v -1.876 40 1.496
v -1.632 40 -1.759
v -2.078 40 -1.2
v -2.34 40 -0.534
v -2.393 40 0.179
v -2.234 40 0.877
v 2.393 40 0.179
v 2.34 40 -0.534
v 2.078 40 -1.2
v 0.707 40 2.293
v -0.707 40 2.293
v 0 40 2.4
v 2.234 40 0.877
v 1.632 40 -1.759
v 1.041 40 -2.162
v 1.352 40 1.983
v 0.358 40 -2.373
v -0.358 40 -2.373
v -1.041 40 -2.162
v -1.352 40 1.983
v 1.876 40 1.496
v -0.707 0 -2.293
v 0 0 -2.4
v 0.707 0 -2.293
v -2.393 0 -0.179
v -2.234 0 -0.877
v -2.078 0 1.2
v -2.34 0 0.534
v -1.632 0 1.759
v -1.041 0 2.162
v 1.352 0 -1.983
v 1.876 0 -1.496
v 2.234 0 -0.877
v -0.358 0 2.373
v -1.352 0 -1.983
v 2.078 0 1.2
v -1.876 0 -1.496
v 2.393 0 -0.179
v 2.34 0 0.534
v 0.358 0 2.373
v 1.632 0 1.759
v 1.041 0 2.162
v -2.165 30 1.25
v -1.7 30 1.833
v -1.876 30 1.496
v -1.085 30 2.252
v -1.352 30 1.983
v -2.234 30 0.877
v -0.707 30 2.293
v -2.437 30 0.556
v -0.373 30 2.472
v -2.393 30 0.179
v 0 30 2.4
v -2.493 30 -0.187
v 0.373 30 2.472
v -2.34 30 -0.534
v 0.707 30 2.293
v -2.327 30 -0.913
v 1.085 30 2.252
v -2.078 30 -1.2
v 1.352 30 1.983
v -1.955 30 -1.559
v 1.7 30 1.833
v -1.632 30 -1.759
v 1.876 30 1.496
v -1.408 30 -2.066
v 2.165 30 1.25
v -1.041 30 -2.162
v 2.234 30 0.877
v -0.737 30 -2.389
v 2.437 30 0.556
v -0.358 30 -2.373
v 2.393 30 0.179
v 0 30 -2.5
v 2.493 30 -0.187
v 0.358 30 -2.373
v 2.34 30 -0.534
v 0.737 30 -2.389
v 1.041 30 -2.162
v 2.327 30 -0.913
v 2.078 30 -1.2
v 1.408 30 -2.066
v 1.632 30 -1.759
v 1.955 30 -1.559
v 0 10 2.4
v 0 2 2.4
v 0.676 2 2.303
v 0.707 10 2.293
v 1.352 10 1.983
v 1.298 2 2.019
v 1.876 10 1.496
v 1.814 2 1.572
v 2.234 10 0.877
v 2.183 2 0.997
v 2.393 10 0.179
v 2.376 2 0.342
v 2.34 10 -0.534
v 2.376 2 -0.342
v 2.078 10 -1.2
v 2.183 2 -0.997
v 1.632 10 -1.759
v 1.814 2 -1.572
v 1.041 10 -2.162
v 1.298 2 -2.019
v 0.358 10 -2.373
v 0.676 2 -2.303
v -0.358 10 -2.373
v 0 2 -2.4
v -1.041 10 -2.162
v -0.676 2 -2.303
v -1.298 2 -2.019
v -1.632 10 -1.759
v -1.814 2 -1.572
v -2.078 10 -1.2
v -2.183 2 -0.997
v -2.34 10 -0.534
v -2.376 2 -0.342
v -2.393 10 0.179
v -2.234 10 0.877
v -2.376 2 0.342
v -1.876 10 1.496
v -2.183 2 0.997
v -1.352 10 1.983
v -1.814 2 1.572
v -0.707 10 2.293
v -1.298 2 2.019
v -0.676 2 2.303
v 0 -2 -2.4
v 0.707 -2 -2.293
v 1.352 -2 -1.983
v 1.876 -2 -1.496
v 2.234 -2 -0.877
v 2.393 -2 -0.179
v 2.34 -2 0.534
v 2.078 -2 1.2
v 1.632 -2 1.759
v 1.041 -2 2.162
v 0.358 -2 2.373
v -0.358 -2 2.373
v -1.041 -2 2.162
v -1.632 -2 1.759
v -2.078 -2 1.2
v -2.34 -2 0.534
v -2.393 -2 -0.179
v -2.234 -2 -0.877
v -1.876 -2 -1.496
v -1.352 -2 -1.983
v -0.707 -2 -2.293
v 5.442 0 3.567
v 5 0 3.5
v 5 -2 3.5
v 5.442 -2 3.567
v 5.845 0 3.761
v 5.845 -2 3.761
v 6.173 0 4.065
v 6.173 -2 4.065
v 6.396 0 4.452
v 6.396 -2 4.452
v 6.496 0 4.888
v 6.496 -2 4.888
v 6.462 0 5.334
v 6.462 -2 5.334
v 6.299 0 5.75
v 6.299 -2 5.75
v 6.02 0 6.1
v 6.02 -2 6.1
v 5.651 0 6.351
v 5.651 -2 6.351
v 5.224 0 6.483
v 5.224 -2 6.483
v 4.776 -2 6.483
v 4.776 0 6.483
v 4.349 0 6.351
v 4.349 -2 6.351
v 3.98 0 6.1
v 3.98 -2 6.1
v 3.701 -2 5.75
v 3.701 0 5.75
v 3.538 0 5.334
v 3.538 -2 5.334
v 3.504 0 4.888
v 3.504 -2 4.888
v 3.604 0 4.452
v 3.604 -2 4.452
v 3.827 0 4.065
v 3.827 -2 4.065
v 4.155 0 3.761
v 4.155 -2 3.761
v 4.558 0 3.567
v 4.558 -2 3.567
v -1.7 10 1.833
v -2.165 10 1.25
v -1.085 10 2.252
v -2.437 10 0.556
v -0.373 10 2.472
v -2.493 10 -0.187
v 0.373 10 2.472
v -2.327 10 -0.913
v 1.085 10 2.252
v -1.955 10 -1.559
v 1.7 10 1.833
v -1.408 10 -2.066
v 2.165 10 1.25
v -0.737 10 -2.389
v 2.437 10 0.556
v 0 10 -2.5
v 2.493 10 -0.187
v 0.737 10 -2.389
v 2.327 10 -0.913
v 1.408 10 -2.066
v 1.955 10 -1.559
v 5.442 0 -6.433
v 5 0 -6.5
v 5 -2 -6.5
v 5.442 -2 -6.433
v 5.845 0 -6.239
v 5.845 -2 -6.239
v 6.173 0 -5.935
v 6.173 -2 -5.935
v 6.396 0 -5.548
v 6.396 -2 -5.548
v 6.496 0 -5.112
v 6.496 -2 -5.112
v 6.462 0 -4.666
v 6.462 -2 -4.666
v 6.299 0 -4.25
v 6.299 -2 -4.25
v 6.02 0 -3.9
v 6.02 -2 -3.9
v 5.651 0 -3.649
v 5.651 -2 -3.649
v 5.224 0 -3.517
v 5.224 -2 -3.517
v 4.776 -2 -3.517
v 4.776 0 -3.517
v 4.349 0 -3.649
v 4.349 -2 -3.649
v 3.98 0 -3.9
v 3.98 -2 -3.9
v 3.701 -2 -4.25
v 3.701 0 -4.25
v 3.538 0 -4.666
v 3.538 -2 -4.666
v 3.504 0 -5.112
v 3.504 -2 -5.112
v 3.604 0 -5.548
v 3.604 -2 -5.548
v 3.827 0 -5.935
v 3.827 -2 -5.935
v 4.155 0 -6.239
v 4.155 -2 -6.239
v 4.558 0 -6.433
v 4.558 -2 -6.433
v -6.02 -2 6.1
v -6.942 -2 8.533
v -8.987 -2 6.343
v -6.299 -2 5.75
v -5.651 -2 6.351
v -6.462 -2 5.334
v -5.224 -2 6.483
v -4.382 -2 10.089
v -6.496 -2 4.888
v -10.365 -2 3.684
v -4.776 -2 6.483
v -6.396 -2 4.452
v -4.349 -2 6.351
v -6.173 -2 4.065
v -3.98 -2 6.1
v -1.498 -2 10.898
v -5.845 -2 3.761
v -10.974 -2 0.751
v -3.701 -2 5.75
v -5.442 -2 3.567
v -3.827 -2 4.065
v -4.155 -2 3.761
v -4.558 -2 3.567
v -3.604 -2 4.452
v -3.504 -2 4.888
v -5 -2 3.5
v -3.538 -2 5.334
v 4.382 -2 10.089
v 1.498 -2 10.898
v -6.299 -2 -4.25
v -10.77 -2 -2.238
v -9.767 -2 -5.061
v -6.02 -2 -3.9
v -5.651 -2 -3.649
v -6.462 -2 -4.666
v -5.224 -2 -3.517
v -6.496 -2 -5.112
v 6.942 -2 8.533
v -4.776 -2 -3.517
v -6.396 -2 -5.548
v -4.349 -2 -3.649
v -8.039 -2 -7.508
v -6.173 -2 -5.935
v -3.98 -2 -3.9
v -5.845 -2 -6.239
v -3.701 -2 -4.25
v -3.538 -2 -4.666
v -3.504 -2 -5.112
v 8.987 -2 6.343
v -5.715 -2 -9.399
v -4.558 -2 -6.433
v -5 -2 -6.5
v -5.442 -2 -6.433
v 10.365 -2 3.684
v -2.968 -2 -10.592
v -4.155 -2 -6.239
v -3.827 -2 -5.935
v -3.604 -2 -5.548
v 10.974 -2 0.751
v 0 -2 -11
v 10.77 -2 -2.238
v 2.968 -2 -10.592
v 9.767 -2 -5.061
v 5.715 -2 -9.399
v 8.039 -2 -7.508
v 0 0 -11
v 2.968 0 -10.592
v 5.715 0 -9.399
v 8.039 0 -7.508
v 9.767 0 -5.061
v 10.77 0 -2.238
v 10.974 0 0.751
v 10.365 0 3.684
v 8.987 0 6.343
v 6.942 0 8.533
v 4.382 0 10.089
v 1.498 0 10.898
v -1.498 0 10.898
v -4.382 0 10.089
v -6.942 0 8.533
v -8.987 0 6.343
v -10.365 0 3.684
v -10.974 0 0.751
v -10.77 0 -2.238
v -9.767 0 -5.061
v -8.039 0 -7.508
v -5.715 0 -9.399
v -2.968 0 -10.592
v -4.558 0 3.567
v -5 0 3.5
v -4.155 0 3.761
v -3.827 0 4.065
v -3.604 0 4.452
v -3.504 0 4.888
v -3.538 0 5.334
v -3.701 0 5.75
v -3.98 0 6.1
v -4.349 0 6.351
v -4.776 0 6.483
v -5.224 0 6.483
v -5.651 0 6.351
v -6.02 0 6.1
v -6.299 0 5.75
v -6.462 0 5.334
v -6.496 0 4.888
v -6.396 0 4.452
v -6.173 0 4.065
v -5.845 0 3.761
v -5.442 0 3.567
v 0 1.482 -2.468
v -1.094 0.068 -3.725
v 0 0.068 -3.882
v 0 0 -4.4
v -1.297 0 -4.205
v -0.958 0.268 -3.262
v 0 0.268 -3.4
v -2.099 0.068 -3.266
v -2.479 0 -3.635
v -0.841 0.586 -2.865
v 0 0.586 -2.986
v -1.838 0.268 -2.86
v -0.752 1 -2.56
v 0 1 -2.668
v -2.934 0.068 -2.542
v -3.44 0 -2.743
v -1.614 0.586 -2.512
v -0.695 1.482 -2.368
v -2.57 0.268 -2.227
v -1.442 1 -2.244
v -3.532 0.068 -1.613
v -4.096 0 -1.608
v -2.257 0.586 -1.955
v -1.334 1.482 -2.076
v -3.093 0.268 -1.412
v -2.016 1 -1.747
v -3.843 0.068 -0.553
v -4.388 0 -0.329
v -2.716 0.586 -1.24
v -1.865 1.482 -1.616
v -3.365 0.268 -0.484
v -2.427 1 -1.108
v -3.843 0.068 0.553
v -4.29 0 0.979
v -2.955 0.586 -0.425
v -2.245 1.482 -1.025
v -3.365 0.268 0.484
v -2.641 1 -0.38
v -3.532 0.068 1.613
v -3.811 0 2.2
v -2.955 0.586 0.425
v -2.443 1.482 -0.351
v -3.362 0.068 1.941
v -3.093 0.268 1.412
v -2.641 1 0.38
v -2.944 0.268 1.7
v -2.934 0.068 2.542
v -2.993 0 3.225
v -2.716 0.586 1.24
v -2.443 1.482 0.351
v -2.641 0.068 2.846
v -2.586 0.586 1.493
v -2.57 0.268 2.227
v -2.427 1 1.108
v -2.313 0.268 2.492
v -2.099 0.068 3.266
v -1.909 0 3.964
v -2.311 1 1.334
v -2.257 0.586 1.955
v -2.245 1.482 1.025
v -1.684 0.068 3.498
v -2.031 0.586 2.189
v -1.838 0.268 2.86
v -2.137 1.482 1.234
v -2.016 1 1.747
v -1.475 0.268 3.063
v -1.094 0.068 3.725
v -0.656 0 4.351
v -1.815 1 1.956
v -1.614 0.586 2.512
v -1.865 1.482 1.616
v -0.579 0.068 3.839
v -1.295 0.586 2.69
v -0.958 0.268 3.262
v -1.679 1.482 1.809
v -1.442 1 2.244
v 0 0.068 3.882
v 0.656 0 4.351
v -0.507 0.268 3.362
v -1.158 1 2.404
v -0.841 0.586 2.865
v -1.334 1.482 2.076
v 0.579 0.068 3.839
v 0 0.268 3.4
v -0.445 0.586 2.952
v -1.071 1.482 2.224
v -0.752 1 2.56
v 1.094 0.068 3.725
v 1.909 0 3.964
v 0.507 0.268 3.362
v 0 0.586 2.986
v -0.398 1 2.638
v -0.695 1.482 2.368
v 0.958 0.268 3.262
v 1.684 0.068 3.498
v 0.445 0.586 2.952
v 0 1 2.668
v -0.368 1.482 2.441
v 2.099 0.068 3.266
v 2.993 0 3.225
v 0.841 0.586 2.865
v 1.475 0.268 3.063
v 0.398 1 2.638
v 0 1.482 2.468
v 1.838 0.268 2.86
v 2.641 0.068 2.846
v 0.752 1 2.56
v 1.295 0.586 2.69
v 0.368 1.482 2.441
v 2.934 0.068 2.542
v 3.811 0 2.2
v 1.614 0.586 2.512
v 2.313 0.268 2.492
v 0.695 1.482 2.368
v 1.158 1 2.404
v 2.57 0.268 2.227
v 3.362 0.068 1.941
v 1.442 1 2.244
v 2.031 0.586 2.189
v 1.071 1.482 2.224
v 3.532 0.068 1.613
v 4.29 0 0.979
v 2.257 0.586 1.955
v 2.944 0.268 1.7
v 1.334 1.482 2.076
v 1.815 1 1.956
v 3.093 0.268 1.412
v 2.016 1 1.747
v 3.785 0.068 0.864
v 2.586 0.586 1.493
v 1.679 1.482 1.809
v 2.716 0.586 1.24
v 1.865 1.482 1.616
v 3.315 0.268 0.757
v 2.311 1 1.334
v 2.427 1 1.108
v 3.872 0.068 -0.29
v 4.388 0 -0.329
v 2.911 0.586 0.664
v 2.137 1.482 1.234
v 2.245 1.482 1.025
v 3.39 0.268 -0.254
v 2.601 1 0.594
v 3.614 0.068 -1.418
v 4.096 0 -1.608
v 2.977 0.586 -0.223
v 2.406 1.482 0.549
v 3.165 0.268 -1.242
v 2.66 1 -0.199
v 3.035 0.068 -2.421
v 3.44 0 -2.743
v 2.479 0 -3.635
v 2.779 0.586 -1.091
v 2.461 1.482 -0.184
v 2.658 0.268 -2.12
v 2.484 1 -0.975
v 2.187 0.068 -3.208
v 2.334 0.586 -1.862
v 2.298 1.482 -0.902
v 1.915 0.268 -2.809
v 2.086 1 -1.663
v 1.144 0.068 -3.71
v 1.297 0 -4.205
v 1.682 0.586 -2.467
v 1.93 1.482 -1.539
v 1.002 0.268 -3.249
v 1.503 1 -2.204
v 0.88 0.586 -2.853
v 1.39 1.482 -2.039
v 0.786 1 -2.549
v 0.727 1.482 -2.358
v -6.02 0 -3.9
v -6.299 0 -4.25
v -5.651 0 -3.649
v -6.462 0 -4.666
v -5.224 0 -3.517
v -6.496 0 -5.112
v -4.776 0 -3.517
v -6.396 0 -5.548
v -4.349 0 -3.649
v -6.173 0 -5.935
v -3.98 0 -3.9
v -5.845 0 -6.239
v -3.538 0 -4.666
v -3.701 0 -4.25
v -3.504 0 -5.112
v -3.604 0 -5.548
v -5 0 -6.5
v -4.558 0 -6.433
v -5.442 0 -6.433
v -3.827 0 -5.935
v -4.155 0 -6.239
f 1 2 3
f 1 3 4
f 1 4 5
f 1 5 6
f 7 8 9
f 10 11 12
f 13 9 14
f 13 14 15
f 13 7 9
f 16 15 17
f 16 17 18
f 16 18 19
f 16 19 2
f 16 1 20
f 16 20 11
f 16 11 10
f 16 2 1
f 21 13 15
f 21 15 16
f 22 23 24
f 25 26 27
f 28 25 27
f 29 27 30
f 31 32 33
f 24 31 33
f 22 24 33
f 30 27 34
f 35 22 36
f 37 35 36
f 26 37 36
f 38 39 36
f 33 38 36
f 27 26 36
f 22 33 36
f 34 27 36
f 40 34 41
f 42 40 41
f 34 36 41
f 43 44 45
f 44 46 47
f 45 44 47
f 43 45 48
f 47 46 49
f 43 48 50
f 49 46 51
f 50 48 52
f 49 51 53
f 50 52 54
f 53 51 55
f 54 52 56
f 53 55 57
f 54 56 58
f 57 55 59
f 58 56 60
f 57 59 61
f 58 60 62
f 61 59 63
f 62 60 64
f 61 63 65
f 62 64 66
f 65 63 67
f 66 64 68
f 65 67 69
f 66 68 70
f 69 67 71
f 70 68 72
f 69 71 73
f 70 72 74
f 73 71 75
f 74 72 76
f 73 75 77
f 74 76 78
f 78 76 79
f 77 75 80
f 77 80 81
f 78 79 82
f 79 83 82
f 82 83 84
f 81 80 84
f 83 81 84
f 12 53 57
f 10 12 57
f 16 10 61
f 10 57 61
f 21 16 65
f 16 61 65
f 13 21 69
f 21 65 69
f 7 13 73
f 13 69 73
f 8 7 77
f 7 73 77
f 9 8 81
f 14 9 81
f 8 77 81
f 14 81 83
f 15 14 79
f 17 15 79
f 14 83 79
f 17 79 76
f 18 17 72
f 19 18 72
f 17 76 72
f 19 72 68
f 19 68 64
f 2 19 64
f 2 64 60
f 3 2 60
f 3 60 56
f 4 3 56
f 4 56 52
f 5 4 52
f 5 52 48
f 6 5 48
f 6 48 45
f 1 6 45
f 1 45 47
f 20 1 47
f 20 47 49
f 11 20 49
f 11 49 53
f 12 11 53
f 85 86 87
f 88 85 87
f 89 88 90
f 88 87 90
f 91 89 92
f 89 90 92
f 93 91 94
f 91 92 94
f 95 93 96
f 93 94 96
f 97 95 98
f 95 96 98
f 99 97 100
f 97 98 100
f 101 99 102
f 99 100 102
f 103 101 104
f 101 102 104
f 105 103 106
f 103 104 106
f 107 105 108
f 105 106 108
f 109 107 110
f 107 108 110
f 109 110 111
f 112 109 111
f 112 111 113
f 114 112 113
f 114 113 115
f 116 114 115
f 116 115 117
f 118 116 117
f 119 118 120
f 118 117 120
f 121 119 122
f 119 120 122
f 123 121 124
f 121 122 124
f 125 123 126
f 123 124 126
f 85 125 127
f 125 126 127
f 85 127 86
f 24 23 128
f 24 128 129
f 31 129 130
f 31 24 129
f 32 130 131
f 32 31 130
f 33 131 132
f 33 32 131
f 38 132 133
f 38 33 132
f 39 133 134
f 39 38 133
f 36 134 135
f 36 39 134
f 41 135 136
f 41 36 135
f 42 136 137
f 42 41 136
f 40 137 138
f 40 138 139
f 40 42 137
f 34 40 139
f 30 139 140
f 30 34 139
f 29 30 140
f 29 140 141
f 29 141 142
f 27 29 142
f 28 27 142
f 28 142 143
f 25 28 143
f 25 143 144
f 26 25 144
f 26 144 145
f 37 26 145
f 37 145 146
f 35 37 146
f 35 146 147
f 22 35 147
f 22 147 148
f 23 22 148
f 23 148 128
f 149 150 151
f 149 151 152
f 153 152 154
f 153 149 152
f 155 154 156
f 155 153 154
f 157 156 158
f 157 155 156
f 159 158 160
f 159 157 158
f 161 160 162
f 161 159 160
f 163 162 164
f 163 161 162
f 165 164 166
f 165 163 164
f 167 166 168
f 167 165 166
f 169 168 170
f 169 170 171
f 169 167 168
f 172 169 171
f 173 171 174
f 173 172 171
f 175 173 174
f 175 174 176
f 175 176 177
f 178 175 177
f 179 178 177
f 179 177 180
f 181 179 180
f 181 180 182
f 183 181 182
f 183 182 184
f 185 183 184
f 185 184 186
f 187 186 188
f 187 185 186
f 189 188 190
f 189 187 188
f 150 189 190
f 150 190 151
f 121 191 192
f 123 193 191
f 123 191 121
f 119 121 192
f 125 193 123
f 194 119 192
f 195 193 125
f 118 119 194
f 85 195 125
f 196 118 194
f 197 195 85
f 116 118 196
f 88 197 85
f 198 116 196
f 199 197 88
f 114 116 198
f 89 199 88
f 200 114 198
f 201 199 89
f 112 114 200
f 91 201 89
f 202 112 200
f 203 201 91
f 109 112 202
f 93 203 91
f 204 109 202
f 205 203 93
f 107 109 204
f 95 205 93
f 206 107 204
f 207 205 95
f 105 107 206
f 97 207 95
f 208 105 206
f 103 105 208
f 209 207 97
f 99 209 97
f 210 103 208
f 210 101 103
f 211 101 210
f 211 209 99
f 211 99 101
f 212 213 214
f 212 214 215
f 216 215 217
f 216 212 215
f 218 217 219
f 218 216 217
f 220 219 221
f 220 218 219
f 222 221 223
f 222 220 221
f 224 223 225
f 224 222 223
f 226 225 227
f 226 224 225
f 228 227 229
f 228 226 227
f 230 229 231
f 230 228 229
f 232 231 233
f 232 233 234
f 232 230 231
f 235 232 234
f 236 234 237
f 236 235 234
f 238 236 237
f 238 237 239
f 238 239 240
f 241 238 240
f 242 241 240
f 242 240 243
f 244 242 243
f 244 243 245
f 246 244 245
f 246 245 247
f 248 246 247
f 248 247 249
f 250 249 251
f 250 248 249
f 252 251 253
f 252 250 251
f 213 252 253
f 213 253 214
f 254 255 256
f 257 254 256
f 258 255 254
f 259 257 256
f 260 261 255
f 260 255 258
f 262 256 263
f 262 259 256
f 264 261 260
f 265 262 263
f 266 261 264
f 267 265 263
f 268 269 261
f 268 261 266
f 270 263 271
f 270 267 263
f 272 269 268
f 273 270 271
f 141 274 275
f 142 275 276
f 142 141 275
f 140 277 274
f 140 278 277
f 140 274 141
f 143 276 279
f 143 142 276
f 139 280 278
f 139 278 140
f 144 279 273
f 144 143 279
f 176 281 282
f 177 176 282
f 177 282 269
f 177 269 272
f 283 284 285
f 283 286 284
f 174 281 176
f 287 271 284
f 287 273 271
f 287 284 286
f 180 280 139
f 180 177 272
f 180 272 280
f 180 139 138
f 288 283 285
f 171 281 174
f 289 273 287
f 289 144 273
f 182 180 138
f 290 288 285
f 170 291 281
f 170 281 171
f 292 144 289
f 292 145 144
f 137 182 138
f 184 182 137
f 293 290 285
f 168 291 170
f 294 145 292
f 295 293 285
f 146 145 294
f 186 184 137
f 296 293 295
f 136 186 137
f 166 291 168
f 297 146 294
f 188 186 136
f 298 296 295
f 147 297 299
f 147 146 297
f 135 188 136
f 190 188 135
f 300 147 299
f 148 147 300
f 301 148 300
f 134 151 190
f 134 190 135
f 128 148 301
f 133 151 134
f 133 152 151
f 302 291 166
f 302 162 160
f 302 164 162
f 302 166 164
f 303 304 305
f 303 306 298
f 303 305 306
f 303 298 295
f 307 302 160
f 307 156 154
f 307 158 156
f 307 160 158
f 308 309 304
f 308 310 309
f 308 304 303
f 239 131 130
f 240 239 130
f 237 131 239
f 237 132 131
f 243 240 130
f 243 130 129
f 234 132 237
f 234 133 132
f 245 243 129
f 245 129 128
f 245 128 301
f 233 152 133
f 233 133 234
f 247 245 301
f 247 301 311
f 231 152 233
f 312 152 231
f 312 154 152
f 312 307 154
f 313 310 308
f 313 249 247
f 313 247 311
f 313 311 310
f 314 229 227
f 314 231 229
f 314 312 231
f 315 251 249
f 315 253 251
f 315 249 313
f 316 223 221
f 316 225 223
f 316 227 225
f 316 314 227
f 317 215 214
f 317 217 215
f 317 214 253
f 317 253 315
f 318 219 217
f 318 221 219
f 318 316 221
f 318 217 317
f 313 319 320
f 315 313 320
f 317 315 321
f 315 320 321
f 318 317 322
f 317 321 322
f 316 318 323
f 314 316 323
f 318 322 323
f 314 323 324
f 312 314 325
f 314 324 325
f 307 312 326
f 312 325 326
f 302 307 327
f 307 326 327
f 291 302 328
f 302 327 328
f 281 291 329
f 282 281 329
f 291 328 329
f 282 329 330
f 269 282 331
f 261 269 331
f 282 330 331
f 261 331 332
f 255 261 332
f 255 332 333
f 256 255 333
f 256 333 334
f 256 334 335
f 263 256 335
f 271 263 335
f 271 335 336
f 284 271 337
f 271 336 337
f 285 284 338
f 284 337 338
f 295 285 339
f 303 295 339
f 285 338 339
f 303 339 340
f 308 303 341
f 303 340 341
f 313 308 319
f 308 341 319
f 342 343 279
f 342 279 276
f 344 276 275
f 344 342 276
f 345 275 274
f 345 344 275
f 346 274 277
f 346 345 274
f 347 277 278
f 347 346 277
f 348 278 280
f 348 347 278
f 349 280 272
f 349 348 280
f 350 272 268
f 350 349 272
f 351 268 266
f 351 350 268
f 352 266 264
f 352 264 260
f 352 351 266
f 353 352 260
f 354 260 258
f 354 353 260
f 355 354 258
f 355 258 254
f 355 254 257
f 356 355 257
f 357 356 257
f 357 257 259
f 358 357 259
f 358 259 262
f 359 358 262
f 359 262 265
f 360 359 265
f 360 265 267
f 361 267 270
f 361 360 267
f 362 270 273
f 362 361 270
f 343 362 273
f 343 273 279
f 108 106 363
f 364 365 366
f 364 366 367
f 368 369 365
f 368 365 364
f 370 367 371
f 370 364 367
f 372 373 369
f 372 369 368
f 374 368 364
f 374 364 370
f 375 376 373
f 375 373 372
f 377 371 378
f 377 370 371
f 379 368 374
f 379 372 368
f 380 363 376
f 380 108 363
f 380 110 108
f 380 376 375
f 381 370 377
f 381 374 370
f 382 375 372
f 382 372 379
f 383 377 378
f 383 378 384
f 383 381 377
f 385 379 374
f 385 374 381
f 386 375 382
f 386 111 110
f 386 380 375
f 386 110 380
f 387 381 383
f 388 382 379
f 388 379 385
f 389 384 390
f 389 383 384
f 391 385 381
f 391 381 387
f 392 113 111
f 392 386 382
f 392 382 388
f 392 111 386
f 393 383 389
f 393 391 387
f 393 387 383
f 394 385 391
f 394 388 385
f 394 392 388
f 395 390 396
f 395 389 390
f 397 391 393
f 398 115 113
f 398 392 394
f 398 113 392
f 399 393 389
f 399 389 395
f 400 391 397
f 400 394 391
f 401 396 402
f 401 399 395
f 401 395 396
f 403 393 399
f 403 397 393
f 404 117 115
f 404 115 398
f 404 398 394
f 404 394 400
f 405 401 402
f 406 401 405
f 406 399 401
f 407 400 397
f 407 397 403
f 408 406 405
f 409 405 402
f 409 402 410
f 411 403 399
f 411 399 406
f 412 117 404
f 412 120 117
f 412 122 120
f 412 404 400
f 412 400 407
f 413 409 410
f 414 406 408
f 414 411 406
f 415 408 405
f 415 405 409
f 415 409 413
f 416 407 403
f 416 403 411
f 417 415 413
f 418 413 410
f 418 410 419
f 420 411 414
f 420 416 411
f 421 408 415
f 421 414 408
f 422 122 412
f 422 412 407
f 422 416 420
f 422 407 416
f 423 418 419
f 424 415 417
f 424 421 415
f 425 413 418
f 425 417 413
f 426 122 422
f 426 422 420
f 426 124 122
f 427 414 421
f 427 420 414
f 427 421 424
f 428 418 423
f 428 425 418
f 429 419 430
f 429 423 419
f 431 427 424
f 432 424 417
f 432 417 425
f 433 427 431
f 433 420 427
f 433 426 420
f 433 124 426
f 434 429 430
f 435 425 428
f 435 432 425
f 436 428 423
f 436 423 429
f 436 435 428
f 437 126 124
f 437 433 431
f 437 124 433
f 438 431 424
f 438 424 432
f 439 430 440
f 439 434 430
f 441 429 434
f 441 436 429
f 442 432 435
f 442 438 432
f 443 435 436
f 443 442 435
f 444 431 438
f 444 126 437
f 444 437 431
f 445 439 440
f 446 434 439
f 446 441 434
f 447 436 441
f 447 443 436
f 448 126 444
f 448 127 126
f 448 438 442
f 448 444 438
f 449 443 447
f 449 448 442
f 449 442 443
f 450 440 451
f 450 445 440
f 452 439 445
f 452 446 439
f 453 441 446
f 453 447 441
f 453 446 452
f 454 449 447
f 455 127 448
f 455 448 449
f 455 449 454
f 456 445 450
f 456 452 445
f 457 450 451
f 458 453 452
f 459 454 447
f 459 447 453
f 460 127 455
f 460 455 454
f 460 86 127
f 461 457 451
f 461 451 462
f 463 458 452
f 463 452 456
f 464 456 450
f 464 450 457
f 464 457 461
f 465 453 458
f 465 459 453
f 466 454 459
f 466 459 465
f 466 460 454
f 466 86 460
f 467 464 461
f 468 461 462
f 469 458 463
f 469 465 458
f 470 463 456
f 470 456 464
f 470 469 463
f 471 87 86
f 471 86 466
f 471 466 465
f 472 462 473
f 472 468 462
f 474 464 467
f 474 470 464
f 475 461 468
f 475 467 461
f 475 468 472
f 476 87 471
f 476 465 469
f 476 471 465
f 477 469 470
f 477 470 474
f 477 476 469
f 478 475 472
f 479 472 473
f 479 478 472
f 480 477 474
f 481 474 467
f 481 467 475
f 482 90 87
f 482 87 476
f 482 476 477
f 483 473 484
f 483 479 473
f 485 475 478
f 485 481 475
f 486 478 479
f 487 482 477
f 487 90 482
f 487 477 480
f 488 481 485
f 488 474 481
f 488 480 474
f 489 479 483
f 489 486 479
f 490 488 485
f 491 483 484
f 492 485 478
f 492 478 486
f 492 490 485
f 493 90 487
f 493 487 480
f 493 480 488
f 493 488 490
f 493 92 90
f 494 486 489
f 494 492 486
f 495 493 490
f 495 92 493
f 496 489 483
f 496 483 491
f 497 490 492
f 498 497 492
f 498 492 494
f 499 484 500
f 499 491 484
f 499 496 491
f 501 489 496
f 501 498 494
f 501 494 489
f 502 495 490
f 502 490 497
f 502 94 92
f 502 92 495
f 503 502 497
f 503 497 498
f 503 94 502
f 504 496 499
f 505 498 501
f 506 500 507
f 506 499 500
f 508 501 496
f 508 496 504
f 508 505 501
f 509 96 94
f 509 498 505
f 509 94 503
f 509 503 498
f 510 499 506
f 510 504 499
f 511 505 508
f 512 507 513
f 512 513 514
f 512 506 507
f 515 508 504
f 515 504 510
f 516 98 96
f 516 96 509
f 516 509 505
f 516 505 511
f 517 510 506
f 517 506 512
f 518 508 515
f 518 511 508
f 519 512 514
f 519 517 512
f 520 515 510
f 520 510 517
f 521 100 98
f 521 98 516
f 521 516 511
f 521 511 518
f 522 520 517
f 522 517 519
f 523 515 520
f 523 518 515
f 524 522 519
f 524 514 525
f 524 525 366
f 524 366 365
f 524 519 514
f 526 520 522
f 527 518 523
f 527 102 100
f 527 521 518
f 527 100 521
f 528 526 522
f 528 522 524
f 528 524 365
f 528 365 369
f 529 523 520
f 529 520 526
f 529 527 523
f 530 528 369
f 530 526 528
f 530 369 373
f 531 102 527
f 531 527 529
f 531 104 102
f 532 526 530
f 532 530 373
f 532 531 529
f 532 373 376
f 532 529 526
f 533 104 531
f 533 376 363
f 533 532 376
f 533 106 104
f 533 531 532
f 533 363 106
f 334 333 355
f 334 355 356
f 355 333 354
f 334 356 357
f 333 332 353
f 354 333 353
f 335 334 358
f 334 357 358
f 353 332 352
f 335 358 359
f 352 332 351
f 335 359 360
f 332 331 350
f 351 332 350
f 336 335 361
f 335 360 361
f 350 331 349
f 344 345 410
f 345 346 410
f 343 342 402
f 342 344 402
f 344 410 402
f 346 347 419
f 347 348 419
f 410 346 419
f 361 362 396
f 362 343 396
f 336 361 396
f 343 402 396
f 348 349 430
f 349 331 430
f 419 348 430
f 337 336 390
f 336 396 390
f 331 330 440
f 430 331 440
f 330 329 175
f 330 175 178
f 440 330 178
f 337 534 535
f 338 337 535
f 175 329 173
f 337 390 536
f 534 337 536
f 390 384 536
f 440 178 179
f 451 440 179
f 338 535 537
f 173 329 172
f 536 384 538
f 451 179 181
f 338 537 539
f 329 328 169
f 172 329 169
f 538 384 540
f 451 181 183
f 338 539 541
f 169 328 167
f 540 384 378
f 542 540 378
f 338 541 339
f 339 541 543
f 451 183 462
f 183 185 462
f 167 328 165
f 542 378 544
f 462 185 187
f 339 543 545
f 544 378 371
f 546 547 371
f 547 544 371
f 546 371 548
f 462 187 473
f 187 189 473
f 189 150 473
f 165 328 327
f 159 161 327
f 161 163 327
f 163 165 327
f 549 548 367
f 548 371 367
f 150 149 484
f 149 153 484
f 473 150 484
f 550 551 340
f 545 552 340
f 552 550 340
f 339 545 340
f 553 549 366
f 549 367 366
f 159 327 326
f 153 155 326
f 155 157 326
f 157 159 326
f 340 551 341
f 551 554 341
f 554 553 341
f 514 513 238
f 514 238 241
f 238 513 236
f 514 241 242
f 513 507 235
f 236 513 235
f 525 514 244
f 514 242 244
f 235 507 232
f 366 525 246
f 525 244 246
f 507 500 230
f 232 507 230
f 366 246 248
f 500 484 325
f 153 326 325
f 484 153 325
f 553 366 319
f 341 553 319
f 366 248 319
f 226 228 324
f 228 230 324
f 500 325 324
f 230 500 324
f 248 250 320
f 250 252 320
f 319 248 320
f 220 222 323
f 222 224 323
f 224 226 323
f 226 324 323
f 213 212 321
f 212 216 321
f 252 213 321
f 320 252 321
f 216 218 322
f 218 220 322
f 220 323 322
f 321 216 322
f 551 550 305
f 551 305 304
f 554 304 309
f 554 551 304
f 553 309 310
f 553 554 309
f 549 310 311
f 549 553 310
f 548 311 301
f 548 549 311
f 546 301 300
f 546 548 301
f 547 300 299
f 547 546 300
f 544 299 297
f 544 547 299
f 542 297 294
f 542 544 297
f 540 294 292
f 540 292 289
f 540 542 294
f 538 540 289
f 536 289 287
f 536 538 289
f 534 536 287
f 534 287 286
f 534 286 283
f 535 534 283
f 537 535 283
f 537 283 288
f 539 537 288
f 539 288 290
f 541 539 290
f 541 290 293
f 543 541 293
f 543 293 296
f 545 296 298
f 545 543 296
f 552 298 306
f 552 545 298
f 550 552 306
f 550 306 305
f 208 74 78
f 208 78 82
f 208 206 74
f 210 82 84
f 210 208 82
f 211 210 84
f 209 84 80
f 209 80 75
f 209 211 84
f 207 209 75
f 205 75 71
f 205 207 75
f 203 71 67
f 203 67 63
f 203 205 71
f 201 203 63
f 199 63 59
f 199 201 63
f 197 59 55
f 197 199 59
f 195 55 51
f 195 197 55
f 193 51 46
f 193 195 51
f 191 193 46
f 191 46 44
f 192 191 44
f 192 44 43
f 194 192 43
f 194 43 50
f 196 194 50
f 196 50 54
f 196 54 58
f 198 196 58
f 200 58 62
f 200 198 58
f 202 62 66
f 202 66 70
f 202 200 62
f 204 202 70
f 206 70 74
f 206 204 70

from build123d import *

# Parameters (mm, degrees)
SKETCH_1_R      = 2.4
EXTRUDE_1_DEPTH = 40
SKETCH_2_R      = 2.5
EXTRUDE_2_DEPTH = 10
SKETCH_3_R      = 11
SKETCH_3_R_2    = 1.5
SKETCH_3_R_3    = 2.4
EXTRUDE_3_DEPTH = 2


with BuildPart() as part:
    # 草图1 → 凸台-拉伸1 (new body)
    with BuildSketch(Plane(origin=(0, 0, 0), x_dir=(1, 0, 0), z_dir=(0, 1, 0))):
        with Locations(Location((0, 0, 0), (0, 0, 270))):
            Circle(SKETCH_1_R)
    extrude(amount=EXTRUDE_1_DEPTH)

    # 草图2 → 凸台-拉伸2 (add, symmetric)
    with BuildSketch(Plane(origin=(0, 20, 0), x_dir=(-1, 0, 0), z_dir=(0, -1, 0))):
        with Locations(Location((0, 0, 0), (0, 0, 90))):
            Circle(SKETCH_2_R)
    extrude(amount=EXTRUDE_2_DEPTH, both=True)



with BuildPart() as body_2:
    # 草图3 → 凸台-拉伸3 (new body)
    with BuildSketch(Plane.XZ):
        with Locations(Location((0, 0, 0), (0, 0, 270))):
            Circle(SKETCH_3_R)
        with Locations(Location((-5, -5, 0), (0, 0, 270))):
            Circle(SKETCH_3_R_2, mode=Mode.SUBTRACT)
        with Locations(Location((-5, 5, 0), (0, 0, 270))):
            Circle(SKETCH_3_R_2, mode=Mode.SUBTRACT)
        with Locations(Location((5, 5, 0), (0, 0, 270))):
            Circle(SKETCH_3_R_2, mode=Mode.SUBTRACT)
        with Locations(Location((5, -5, 0), (0, 0, 270))):
            Circle(SKETCH_3_R_2, mode=Mode.SUBTRACT)
        with Locations(Location((0, 0, 0), (0, 0, 270))):
            Circle(SKETCH_3_R_3, mode=Mode.SUBTRACT)
    extrude(amount=EXTRUDE_3_DEPTH)


with BuildPart() as part_1:
    add(part.part)

    add(body_2.part)  # 旋转3 merges body 2
    # 草图4 → 旋转3 (revolve)
    with BuildSketch(Plane(origin=(0, 0, 0), x_dir=(0, 0, -1), z_dir=(1, 0, 0)), mode=Mode.PRIVATE) as revolve_3_sk:
        with BuildLine():
            Line((-2.4, 0), (-4.4, 0))
            ThreePointArc((-4.4, 0), (-2.985786438, 0.585786438), (-2.4, 2))
            Line((-2.4, 2), (-2.4, 0))
        make_face()
    revolve(revolve_3_sk.sketch.rotate(Axis((0, -1000, 0), (0, 1, 0)), 180), axis=Axis((0, -1000, 0), (0, 1, 0)))


solid = part_1.part
